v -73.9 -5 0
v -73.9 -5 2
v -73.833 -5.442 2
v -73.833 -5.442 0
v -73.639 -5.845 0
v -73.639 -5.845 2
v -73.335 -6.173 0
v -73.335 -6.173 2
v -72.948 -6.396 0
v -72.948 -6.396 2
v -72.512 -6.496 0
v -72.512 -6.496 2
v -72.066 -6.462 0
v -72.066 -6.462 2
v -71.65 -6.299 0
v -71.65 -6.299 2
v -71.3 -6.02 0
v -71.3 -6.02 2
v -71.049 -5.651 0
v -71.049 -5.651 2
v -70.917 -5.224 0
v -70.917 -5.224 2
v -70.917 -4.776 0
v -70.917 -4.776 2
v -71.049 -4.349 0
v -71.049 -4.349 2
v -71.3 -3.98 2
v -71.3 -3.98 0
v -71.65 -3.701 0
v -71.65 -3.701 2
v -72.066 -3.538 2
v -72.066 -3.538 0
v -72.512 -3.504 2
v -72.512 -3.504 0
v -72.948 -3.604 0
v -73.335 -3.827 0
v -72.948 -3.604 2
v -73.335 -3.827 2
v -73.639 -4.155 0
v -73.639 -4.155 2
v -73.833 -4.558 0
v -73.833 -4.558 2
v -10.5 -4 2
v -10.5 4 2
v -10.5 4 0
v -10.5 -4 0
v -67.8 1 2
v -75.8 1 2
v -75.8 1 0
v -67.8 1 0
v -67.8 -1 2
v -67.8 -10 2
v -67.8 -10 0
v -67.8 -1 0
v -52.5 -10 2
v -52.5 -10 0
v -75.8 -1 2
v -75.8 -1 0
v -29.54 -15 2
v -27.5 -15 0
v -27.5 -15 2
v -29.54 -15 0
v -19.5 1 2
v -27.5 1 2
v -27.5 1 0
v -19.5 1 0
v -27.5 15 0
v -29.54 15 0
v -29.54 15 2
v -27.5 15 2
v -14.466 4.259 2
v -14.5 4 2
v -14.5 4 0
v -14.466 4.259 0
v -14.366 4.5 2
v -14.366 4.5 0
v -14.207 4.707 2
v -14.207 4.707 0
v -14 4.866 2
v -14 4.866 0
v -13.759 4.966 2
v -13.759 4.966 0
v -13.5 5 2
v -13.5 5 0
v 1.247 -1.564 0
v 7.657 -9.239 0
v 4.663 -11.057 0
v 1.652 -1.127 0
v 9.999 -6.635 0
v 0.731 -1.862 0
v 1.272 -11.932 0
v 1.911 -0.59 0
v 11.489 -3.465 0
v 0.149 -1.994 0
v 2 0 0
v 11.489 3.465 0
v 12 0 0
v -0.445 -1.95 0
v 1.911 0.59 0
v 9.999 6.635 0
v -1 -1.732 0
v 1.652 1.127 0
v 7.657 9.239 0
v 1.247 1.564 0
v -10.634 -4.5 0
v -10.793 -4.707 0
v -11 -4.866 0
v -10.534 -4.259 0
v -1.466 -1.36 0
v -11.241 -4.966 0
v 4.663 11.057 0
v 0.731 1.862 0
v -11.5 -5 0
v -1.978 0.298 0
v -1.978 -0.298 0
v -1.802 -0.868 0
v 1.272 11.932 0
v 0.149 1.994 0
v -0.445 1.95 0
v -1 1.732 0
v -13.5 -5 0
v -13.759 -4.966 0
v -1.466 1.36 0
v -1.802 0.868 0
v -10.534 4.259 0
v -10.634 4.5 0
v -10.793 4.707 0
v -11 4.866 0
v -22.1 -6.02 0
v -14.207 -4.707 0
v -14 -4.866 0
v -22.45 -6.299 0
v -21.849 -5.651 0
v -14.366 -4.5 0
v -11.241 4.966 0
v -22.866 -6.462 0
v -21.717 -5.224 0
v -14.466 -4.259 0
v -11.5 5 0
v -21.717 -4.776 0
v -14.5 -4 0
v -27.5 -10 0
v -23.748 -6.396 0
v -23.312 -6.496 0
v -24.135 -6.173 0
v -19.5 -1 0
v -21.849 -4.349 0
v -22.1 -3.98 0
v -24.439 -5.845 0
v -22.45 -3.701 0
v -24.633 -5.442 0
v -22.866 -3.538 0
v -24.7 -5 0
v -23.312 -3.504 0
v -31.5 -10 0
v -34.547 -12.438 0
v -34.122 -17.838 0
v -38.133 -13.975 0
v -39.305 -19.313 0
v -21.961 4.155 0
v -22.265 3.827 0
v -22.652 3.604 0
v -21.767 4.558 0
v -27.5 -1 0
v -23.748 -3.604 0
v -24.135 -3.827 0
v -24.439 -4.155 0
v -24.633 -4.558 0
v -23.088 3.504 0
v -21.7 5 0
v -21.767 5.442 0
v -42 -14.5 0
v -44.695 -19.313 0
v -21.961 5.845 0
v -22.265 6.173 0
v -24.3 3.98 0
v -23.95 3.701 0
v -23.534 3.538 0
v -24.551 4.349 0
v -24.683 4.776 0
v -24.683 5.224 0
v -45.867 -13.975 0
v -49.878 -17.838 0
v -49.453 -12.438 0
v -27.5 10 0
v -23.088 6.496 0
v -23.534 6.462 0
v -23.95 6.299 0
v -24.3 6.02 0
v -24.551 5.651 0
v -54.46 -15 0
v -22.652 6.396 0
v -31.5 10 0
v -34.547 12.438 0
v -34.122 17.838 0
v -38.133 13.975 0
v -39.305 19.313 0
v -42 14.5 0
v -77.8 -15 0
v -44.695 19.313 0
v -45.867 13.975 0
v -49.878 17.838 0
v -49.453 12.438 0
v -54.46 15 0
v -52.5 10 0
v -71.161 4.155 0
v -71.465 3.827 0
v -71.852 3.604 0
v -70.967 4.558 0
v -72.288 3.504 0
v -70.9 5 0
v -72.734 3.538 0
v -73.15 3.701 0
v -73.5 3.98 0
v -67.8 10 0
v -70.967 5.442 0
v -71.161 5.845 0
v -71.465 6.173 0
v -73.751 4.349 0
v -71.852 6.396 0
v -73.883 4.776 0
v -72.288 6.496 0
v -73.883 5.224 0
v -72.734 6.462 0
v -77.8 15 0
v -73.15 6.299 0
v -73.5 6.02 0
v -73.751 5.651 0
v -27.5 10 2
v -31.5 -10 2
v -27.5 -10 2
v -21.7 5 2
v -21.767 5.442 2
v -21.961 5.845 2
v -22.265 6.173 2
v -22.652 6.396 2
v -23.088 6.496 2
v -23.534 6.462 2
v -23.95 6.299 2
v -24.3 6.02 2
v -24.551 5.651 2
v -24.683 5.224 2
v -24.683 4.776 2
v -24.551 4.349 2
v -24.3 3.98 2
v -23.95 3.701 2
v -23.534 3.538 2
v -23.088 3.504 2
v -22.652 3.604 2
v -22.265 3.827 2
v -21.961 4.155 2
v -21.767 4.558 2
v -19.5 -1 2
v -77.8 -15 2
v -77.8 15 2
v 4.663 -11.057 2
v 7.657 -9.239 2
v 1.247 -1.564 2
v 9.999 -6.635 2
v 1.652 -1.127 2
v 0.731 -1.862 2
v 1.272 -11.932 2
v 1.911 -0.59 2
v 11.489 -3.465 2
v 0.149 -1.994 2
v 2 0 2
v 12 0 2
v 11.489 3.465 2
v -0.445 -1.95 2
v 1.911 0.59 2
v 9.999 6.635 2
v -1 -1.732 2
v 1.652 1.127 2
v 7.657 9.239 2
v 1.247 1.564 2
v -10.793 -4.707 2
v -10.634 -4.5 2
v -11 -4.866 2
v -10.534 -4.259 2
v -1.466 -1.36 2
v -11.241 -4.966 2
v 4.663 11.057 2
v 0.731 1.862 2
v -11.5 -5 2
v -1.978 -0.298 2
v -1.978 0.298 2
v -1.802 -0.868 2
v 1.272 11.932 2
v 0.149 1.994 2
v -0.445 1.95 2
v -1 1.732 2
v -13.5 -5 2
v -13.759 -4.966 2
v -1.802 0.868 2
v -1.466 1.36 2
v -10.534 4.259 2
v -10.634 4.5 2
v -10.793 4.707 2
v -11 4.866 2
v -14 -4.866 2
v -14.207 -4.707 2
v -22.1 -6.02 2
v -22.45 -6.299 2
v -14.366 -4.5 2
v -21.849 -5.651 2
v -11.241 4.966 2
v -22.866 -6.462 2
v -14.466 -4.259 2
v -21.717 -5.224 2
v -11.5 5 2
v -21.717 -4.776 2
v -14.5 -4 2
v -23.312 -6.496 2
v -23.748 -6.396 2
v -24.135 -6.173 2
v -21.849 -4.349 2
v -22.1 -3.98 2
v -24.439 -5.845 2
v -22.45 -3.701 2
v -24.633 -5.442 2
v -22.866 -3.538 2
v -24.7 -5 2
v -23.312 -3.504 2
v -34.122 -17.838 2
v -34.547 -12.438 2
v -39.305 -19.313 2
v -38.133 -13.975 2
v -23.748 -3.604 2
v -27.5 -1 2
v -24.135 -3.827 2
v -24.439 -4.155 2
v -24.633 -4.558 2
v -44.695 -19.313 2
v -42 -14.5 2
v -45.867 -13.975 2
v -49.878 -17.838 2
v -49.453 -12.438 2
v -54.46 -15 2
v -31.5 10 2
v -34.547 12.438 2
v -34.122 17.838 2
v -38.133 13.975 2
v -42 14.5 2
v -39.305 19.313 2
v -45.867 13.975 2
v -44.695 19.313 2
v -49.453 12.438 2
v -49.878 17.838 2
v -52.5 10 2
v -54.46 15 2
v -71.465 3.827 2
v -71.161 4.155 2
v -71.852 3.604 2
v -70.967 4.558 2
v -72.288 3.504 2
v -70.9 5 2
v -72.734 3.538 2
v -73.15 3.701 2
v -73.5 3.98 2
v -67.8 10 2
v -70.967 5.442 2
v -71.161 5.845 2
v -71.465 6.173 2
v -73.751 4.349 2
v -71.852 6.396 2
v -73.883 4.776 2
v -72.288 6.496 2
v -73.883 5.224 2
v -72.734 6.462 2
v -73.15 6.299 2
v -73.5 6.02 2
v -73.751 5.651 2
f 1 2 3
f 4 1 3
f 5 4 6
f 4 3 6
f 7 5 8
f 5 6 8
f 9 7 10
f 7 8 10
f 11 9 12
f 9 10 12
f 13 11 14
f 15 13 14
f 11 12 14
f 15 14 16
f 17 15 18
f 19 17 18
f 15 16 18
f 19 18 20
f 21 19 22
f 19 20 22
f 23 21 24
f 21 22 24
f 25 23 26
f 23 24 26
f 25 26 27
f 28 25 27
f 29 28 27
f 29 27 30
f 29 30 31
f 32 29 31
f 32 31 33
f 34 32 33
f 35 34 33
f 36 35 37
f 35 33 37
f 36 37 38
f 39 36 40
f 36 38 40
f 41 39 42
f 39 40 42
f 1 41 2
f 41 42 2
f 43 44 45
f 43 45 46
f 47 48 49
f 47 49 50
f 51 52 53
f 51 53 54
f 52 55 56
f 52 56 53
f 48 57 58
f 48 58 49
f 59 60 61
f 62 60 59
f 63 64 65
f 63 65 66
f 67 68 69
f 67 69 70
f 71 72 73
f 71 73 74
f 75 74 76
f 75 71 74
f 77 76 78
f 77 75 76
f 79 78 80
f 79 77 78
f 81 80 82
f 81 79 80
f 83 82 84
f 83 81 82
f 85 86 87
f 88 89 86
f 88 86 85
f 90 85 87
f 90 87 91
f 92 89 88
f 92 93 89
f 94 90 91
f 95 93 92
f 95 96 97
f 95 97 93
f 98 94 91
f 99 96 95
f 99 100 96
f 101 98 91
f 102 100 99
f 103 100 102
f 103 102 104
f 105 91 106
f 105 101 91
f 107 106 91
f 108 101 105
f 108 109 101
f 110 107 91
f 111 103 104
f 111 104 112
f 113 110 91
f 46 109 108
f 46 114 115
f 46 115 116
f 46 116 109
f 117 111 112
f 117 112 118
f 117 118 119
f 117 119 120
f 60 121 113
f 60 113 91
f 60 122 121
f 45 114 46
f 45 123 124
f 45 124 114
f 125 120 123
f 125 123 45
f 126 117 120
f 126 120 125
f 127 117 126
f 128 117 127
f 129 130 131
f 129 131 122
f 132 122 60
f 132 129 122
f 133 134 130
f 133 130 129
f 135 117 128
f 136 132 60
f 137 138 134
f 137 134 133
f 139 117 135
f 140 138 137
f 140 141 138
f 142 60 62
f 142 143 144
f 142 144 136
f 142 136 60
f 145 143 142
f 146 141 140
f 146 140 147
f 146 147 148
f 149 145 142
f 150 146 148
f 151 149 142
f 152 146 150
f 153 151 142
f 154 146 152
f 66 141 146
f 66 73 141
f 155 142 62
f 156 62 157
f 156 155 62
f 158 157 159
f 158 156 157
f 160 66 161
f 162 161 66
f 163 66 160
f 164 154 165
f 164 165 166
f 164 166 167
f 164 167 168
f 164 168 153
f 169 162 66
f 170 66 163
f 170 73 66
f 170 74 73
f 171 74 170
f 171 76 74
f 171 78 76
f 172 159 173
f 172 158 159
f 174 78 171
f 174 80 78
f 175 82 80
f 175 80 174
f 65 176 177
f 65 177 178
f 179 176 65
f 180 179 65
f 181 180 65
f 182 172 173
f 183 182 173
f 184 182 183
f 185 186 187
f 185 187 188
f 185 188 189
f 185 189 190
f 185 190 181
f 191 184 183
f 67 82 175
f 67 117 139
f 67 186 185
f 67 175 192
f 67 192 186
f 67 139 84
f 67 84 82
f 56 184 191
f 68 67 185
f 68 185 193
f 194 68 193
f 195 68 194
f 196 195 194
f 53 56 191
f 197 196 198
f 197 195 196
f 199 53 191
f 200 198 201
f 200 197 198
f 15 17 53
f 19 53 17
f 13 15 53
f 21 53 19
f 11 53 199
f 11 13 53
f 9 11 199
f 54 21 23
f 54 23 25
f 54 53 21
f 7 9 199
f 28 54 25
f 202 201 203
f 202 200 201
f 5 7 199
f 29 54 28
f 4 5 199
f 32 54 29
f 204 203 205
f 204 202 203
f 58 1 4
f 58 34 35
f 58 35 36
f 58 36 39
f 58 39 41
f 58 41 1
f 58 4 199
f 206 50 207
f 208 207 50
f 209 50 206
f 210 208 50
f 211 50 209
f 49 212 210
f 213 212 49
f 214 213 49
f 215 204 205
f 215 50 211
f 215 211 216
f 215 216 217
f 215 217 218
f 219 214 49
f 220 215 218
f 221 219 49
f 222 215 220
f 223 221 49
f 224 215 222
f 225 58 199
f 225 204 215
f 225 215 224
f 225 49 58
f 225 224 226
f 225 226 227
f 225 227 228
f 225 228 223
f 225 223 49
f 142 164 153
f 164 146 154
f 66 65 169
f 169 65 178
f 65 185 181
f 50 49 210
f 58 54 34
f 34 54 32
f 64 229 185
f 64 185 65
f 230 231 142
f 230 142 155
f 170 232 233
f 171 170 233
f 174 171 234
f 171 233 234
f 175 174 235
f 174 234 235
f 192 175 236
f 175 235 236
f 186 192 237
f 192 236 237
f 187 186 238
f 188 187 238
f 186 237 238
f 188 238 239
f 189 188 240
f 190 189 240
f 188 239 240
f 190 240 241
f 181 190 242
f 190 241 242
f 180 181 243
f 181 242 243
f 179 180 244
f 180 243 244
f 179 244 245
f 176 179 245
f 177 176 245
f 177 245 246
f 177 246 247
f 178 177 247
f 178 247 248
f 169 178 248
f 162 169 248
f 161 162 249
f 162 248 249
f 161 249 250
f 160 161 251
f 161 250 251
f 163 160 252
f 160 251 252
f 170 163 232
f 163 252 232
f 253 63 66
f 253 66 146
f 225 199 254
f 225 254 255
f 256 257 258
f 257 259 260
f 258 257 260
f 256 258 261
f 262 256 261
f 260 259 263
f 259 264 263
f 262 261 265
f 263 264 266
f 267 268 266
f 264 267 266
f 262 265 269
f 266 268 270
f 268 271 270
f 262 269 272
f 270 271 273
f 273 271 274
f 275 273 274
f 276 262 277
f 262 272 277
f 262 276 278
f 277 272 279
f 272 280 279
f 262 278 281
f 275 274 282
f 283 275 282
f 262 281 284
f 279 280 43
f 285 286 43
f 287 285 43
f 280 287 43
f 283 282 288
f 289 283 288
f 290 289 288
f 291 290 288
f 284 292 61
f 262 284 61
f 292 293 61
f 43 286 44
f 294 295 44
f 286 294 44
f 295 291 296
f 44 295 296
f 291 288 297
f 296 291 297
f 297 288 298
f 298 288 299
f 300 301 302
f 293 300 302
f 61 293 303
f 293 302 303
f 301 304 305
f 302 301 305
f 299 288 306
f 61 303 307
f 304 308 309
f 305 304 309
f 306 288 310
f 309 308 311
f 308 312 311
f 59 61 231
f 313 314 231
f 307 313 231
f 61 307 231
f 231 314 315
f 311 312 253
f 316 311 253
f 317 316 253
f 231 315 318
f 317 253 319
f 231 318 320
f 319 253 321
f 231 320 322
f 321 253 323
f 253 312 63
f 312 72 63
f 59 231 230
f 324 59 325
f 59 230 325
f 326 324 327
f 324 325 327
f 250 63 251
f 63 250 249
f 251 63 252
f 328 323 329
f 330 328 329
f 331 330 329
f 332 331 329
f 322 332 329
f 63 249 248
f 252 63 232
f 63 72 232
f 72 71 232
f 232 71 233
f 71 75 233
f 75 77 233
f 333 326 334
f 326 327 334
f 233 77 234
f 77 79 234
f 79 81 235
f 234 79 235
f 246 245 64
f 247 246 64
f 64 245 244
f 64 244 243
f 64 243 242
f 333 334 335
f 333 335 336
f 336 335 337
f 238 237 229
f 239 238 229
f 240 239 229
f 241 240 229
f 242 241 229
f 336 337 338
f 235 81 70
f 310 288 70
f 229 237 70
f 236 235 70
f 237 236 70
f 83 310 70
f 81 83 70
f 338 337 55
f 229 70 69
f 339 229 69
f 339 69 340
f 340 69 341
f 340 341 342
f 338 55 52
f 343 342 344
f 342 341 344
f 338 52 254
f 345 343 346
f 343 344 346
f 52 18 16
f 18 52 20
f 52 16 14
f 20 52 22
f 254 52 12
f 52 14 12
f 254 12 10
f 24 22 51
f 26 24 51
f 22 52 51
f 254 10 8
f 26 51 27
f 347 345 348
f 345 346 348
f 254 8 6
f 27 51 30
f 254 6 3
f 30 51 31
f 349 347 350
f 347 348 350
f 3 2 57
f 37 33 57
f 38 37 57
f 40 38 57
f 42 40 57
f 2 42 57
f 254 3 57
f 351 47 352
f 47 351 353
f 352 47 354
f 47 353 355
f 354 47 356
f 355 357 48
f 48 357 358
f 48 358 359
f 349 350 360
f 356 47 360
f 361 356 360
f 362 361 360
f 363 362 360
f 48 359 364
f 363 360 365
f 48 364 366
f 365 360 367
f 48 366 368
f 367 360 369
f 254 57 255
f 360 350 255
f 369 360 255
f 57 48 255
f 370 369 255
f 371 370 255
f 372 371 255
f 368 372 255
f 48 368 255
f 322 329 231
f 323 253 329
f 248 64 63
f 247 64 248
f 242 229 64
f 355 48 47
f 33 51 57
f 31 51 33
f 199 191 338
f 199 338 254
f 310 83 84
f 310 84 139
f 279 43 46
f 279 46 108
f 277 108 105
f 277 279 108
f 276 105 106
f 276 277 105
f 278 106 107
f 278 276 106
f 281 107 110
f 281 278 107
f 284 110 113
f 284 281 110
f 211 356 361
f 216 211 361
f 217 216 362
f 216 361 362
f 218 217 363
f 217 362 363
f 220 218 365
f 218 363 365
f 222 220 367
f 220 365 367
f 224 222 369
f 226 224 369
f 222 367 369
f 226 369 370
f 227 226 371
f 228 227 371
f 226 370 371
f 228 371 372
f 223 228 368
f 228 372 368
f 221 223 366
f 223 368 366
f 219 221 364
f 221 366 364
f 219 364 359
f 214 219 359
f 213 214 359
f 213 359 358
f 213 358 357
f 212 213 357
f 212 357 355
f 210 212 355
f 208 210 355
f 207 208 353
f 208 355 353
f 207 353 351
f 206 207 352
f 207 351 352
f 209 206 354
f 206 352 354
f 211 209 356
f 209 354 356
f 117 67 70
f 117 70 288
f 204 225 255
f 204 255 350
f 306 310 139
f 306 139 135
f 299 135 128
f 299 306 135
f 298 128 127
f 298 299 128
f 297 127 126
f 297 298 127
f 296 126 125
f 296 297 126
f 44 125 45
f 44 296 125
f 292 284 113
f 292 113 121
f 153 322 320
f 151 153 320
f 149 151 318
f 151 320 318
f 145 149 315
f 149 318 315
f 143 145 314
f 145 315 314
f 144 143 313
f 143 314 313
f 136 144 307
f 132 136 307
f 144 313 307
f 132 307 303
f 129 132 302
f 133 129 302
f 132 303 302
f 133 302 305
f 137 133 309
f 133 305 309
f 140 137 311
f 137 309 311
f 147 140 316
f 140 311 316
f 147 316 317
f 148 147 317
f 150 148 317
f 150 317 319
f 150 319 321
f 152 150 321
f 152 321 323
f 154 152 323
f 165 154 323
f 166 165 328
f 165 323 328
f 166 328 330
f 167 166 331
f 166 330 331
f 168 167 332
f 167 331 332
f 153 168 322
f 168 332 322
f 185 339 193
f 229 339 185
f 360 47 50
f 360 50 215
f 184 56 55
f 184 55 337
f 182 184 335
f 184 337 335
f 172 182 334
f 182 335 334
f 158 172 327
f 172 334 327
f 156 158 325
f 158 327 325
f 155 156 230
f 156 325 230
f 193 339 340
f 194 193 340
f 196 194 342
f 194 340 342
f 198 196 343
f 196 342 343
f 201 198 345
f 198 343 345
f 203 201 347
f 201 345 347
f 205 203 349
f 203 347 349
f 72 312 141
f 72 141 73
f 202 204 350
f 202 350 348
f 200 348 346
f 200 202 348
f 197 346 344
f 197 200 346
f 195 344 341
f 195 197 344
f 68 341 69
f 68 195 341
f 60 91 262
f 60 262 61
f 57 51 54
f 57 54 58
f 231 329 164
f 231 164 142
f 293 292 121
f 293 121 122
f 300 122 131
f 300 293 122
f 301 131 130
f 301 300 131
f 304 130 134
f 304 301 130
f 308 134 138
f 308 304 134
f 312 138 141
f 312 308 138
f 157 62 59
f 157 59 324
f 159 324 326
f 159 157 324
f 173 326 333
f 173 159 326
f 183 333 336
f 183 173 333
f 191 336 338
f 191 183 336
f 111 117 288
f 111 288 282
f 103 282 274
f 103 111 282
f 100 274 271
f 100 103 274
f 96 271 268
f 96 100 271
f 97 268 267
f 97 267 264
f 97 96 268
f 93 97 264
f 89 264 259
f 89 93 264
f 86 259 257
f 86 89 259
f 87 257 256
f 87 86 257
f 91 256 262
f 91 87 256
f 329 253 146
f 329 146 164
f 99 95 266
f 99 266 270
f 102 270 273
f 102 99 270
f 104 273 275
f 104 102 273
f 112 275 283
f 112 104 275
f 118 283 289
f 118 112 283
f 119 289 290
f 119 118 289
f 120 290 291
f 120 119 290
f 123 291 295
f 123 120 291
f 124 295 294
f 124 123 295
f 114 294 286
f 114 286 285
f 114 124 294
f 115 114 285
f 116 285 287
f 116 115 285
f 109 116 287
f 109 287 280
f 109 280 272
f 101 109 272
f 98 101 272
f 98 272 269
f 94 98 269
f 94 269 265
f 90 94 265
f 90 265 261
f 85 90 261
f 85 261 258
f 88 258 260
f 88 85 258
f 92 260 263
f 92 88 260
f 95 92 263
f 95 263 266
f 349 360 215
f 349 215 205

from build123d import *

# Parameters (mm, degrees)
SKETCH1_R      = 2
EXTRUDE1_DEPTH = 2
SKETCH2_R      = 1.5
EXTRUDE2_DEPTH = 2
EXTRUDE3_DEPTH = 2
EXTRUDE4_DEPTH = 2
SKETCH5_R      = 14.5
EXTRUDE5_DEPTH = 2


with BuildPart() as part:
    # Sketch1 → Extrude1 (new body)
    with BuildSketch(Plane.XY):
        with BuildLine():
            Line((1.27220287, -11.932371929), (-27.5, -15))
            Line((-27.5, -15), (-29.540064206, -15))
            ThreePointArc((-29.540064206, -15), (-42, -19.5), (-54.459935794, -15))
            Line((-54.459935794, -15), (-77.8, -15))
            Line((-77.8, -15), (-77.8, 15))
            Line((-77.8, 15), (-54.459935794, 15))
            ThreePointArc((-54.459935794, 15), (-42, 19.5), (-29.540064206, 15))
            Line((-29.540064206, 15), (-27.5, 15))
            Line((-27.5, 15), (1.27220287, 11.932371929))
            ThreePointArc((1.27220287, 11.932371929), (12, 0), (1.27220287, -11.932371929))
        make_face()
        Circle(SKETCH1_R, mode=Mode.SUBTRACT)
    extrude(amount=EXTRUDE1_DEPTH)

    # Sketch2 → Extrude2 (cut)
    with BuildSketch(Plane.XY.offset(2)):
        with Locations((-23.2, 5)):
            Circle(SKETCH2_R)
        with Locations((-72.4, 5)):
            Circle(SKETCH2_R)
        with Locations(Location((-23.2, -5, 0), (0, 0, 180))):
            Circle(SKETCH2_R)
        with Locations(Location((-72.4, -5, 0), (0, 0, 180))):
            Circle(SKETCH2_R)
    extrude(amount=-EXTRUDE2_DEPTH, mode=Mode.SUBTRACT)

    # Sketch3 → Extrude3 (cut)
    with BuildSketch(Plane.XY.offset(2)):
        with BuildLine():
            Line((-13.5, 5), (-11.5, 5))
            ThreePointArc((-11.5, 5), (-10.792893219, 4.707106781), (-10.5, 4))
            Line((-10.5, 4), (-10.5, -4))
            ThreePointArc((-10.5, -4), (-10.792893219, -4.707106781), (-11.5, -5))
            Line((-11.5, -5), (-13.5, -5))
            ThreePointArc((-13.5, -5), (-14.207106781, -4.707106781), (-14.5, -4))
            Line((-14.5, -4), (-14.5, 4))
            ThreePointArc((-14.5, 4), (-14.207106781, 4.707106781), (-13.5, 5))
        make_face()
    extrude(amount=-EXTRUDE3_DEPTH, mode=Mode.SUBTRACT)

    # Sketch4 → Extrude4 (cut)
    with BuildSketch(Plane.XY.offset(2)):
        Polygon((-27.5, -1), (-27.5, -10), (-67.8, -10), (-67.8, -1), (-75.8, -1), (-75.8, 1), (-67.8, 1), (-67.8, 10), (-27.5, 10), (-27.5, 1), (-19.5, 1), (-19.5, -1), align=None)
    extrude(amount=-EXTRUDE4_DEPTH, mode=Mode.SUBTRACT)

    # Sketch5 → Extrude5 (cut)
    with BuildSketch(Plane.XY.offset(2)):
        with Locations((-42, 0)):
            Circle(SKETCH5_R)
    extrude(amount=-EXTRUDE5_DEPTH, mode=Mode.SUBTRACT)


solid = part.part
